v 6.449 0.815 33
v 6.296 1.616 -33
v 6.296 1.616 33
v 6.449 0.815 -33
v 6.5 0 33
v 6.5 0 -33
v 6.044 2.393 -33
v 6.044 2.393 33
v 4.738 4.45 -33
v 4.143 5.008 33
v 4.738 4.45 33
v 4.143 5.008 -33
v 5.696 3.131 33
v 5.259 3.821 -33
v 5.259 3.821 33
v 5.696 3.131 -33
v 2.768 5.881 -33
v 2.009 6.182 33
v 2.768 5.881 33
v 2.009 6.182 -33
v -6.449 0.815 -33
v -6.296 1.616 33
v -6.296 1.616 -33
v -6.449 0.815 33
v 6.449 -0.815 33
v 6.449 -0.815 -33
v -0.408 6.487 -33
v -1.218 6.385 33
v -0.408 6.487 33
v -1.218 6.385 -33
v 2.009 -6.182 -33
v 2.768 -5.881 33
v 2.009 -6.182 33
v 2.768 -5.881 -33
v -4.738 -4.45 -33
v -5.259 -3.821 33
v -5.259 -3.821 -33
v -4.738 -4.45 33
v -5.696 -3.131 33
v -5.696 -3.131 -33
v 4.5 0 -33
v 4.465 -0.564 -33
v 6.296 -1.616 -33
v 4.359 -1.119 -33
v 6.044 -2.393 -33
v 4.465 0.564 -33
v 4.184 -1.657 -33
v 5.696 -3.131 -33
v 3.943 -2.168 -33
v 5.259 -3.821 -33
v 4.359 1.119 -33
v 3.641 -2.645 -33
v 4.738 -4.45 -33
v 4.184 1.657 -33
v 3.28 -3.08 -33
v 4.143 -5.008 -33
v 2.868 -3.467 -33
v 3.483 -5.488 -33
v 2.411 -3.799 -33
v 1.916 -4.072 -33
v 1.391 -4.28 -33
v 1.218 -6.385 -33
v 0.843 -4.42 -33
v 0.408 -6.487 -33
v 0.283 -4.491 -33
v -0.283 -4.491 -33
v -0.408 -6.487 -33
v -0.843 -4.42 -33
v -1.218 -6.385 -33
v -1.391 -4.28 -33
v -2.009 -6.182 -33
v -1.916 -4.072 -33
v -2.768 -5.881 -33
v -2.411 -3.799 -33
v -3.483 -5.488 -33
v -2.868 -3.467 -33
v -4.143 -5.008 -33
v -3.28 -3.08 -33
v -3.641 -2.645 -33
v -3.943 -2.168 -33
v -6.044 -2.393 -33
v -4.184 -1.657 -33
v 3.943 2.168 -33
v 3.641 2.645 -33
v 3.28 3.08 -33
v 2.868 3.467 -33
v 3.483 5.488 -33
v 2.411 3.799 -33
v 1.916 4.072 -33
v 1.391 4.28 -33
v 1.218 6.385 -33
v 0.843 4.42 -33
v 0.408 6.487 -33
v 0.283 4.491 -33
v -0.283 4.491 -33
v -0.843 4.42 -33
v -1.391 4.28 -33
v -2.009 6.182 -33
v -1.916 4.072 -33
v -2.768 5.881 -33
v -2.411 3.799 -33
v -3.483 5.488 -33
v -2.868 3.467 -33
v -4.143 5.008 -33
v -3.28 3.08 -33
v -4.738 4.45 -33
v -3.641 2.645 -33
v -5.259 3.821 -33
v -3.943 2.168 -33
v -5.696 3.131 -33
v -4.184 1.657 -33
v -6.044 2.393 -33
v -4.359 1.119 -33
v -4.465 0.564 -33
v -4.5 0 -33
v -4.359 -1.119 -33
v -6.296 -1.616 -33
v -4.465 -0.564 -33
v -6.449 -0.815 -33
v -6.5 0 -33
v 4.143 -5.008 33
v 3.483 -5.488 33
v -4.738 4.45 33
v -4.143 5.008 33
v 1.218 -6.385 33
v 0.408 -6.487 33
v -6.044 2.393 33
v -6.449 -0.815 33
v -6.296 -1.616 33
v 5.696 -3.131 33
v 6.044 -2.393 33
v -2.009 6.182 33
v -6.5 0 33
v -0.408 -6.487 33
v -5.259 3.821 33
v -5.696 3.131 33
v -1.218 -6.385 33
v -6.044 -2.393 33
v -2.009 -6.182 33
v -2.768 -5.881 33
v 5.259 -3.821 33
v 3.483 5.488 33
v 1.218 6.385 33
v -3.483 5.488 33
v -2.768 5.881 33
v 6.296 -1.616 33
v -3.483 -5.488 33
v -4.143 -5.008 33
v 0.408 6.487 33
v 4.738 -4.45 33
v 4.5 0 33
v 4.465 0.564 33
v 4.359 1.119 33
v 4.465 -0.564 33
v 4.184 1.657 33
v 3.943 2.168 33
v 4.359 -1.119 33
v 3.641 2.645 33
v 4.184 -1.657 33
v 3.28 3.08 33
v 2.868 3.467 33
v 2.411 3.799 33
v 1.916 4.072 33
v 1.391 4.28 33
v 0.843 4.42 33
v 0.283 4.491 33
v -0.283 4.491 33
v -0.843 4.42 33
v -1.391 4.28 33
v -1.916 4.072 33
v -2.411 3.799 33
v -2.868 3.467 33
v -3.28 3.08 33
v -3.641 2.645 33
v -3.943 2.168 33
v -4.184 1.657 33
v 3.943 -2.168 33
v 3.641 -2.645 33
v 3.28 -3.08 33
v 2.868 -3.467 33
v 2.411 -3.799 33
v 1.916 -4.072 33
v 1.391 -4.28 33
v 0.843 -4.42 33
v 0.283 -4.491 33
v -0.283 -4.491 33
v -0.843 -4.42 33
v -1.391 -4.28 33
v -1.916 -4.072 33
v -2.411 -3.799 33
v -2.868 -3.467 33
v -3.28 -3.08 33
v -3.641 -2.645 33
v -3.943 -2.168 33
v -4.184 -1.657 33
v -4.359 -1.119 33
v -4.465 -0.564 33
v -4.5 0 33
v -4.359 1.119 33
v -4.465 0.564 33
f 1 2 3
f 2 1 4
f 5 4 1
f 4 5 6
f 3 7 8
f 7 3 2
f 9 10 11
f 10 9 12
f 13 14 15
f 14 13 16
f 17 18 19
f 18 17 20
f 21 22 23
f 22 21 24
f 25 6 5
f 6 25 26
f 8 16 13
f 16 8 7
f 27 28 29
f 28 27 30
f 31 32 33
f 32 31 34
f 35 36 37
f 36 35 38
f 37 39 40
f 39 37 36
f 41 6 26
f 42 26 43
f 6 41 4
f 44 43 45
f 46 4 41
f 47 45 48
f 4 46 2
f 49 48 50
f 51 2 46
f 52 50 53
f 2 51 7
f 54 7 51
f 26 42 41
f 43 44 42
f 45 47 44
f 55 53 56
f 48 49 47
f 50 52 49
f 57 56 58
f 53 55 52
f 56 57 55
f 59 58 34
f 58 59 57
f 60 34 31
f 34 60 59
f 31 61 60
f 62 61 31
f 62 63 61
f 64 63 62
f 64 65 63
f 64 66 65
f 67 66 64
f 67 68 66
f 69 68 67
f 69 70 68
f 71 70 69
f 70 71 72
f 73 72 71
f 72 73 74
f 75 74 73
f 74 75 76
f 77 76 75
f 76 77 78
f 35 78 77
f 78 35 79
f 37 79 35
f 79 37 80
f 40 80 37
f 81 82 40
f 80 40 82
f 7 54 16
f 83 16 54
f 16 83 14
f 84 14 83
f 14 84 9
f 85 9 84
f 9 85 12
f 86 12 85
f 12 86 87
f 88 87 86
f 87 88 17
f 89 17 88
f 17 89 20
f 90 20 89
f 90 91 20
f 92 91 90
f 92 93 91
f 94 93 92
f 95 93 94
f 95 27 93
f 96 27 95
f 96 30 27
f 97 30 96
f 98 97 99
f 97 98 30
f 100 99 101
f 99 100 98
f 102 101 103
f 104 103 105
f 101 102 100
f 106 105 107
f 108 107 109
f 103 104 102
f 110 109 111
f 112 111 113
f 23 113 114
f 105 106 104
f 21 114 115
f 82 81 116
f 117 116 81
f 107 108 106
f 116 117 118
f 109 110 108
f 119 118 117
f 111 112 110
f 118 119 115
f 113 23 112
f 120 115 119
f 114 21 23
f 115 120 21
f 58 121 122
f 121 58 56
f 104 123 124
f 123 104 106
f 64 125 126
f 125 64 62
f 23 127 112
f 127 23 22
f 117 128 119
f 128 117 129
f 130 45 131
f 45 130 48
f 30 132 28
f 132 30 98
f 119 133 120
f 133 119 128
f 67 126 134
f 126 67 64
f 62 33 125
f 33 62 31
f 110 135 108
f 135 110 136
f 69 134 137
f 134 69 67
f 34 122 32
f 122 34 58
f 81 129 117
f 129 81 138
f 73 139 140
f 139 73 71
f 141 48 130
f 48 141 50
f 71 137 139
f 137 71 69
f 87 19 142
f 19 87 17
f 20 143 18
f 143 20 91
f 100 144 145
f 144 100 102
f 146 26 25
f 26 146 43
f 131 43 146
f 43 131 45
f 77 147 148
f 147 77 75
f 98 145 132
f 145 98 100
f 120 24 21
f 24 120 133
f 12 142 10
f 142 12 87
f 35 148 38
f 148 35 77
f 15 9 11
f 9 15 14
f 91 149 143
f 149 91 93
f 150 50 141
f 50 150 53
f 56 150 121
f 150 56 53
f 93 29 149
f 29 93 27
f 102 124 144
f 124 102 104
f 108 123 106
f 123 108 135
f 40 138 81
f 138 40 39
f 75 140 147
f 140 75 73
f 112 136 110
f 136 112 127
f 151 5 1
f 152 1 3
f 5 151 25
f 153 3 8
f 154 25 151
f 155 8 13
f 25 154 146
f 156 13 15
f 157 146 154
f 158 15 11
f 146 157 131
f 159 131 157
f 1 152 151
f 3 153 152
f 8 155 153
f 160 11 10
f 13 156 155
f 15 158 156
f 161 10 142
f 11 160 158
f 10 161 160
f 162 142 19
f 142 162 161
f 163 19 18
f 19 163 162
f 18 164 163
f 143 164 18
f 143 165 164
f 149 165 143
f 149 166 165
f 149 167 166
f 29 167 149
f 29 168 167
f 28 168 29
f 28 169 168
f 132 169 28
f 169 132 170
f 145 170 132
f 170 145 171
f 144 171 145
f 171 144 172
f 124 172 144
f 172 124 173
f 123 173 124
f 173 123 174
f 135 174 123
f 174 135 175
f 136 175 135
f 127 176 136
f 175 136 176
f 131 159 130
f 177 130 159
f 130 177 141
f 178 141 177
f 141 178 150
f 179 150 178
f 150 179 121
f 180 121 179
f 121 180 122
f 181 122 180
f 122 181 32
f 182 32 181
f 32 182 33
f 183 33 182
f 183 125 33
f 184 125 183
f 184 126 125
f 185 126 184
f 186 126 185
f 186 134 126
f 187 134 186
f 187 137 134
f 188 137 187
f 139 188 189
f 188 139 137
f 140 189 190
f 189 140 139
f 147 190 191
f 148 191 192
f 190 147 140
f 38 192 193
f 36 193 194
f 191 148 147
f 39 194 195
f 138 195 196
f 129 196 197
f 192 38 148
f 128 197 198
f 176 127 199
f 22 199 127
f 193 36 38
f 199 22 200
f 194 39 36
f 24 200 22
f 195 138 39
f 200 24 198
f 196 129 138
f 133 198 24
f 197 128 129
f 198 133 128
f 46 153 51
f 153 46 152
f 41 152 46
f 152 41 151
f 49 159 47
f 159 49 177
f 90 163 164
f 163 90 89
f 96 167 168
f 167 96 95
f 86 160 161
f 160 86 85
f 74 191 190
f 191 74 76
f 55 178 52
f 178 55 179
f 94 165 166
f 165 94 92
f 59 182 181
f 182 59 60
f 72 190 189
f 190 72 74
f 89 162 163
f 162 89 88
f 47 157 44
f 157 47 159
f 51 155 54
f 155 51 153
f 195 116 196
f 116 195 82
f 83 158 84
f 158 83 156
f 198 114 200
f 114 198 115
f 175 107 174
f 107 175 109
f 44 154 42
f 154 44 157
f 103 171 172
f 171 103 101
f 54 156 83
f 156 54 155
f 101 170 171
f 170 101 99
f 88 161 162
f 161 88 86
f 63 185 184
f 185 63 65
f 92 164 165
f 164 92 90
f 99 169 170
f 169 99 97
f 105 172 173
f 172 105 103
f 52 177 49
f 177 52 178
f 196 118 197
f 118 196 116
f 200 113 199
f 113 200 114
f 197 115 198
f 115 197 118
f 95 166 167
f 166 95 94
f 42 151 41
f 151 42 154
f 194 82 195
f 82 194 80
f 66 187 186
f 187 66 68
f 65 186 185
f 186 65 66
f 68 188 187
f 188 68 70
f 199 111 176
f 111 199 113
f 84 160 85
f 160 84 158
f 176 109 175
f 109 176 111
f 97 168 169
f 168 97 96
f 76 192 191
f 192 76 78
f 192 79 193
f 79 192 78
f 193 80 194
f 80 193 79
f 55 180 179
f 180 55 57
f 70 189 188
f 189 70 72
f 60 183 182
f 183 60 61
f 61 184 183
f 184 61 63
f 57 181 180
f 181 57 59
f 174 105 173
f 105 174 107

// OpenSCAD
$fn = 50;


difference() {
	union() {
		translate(v = [0, 0, -33.0000000000]) {
			cylinder(h = 66, r = 6.5000000000);
		}
	}
	union() {
		translate(v = [0, 0, -100.0000000000]) {
			cylinder(h = 200, r = 4.5000000000);
		}
	}
}
